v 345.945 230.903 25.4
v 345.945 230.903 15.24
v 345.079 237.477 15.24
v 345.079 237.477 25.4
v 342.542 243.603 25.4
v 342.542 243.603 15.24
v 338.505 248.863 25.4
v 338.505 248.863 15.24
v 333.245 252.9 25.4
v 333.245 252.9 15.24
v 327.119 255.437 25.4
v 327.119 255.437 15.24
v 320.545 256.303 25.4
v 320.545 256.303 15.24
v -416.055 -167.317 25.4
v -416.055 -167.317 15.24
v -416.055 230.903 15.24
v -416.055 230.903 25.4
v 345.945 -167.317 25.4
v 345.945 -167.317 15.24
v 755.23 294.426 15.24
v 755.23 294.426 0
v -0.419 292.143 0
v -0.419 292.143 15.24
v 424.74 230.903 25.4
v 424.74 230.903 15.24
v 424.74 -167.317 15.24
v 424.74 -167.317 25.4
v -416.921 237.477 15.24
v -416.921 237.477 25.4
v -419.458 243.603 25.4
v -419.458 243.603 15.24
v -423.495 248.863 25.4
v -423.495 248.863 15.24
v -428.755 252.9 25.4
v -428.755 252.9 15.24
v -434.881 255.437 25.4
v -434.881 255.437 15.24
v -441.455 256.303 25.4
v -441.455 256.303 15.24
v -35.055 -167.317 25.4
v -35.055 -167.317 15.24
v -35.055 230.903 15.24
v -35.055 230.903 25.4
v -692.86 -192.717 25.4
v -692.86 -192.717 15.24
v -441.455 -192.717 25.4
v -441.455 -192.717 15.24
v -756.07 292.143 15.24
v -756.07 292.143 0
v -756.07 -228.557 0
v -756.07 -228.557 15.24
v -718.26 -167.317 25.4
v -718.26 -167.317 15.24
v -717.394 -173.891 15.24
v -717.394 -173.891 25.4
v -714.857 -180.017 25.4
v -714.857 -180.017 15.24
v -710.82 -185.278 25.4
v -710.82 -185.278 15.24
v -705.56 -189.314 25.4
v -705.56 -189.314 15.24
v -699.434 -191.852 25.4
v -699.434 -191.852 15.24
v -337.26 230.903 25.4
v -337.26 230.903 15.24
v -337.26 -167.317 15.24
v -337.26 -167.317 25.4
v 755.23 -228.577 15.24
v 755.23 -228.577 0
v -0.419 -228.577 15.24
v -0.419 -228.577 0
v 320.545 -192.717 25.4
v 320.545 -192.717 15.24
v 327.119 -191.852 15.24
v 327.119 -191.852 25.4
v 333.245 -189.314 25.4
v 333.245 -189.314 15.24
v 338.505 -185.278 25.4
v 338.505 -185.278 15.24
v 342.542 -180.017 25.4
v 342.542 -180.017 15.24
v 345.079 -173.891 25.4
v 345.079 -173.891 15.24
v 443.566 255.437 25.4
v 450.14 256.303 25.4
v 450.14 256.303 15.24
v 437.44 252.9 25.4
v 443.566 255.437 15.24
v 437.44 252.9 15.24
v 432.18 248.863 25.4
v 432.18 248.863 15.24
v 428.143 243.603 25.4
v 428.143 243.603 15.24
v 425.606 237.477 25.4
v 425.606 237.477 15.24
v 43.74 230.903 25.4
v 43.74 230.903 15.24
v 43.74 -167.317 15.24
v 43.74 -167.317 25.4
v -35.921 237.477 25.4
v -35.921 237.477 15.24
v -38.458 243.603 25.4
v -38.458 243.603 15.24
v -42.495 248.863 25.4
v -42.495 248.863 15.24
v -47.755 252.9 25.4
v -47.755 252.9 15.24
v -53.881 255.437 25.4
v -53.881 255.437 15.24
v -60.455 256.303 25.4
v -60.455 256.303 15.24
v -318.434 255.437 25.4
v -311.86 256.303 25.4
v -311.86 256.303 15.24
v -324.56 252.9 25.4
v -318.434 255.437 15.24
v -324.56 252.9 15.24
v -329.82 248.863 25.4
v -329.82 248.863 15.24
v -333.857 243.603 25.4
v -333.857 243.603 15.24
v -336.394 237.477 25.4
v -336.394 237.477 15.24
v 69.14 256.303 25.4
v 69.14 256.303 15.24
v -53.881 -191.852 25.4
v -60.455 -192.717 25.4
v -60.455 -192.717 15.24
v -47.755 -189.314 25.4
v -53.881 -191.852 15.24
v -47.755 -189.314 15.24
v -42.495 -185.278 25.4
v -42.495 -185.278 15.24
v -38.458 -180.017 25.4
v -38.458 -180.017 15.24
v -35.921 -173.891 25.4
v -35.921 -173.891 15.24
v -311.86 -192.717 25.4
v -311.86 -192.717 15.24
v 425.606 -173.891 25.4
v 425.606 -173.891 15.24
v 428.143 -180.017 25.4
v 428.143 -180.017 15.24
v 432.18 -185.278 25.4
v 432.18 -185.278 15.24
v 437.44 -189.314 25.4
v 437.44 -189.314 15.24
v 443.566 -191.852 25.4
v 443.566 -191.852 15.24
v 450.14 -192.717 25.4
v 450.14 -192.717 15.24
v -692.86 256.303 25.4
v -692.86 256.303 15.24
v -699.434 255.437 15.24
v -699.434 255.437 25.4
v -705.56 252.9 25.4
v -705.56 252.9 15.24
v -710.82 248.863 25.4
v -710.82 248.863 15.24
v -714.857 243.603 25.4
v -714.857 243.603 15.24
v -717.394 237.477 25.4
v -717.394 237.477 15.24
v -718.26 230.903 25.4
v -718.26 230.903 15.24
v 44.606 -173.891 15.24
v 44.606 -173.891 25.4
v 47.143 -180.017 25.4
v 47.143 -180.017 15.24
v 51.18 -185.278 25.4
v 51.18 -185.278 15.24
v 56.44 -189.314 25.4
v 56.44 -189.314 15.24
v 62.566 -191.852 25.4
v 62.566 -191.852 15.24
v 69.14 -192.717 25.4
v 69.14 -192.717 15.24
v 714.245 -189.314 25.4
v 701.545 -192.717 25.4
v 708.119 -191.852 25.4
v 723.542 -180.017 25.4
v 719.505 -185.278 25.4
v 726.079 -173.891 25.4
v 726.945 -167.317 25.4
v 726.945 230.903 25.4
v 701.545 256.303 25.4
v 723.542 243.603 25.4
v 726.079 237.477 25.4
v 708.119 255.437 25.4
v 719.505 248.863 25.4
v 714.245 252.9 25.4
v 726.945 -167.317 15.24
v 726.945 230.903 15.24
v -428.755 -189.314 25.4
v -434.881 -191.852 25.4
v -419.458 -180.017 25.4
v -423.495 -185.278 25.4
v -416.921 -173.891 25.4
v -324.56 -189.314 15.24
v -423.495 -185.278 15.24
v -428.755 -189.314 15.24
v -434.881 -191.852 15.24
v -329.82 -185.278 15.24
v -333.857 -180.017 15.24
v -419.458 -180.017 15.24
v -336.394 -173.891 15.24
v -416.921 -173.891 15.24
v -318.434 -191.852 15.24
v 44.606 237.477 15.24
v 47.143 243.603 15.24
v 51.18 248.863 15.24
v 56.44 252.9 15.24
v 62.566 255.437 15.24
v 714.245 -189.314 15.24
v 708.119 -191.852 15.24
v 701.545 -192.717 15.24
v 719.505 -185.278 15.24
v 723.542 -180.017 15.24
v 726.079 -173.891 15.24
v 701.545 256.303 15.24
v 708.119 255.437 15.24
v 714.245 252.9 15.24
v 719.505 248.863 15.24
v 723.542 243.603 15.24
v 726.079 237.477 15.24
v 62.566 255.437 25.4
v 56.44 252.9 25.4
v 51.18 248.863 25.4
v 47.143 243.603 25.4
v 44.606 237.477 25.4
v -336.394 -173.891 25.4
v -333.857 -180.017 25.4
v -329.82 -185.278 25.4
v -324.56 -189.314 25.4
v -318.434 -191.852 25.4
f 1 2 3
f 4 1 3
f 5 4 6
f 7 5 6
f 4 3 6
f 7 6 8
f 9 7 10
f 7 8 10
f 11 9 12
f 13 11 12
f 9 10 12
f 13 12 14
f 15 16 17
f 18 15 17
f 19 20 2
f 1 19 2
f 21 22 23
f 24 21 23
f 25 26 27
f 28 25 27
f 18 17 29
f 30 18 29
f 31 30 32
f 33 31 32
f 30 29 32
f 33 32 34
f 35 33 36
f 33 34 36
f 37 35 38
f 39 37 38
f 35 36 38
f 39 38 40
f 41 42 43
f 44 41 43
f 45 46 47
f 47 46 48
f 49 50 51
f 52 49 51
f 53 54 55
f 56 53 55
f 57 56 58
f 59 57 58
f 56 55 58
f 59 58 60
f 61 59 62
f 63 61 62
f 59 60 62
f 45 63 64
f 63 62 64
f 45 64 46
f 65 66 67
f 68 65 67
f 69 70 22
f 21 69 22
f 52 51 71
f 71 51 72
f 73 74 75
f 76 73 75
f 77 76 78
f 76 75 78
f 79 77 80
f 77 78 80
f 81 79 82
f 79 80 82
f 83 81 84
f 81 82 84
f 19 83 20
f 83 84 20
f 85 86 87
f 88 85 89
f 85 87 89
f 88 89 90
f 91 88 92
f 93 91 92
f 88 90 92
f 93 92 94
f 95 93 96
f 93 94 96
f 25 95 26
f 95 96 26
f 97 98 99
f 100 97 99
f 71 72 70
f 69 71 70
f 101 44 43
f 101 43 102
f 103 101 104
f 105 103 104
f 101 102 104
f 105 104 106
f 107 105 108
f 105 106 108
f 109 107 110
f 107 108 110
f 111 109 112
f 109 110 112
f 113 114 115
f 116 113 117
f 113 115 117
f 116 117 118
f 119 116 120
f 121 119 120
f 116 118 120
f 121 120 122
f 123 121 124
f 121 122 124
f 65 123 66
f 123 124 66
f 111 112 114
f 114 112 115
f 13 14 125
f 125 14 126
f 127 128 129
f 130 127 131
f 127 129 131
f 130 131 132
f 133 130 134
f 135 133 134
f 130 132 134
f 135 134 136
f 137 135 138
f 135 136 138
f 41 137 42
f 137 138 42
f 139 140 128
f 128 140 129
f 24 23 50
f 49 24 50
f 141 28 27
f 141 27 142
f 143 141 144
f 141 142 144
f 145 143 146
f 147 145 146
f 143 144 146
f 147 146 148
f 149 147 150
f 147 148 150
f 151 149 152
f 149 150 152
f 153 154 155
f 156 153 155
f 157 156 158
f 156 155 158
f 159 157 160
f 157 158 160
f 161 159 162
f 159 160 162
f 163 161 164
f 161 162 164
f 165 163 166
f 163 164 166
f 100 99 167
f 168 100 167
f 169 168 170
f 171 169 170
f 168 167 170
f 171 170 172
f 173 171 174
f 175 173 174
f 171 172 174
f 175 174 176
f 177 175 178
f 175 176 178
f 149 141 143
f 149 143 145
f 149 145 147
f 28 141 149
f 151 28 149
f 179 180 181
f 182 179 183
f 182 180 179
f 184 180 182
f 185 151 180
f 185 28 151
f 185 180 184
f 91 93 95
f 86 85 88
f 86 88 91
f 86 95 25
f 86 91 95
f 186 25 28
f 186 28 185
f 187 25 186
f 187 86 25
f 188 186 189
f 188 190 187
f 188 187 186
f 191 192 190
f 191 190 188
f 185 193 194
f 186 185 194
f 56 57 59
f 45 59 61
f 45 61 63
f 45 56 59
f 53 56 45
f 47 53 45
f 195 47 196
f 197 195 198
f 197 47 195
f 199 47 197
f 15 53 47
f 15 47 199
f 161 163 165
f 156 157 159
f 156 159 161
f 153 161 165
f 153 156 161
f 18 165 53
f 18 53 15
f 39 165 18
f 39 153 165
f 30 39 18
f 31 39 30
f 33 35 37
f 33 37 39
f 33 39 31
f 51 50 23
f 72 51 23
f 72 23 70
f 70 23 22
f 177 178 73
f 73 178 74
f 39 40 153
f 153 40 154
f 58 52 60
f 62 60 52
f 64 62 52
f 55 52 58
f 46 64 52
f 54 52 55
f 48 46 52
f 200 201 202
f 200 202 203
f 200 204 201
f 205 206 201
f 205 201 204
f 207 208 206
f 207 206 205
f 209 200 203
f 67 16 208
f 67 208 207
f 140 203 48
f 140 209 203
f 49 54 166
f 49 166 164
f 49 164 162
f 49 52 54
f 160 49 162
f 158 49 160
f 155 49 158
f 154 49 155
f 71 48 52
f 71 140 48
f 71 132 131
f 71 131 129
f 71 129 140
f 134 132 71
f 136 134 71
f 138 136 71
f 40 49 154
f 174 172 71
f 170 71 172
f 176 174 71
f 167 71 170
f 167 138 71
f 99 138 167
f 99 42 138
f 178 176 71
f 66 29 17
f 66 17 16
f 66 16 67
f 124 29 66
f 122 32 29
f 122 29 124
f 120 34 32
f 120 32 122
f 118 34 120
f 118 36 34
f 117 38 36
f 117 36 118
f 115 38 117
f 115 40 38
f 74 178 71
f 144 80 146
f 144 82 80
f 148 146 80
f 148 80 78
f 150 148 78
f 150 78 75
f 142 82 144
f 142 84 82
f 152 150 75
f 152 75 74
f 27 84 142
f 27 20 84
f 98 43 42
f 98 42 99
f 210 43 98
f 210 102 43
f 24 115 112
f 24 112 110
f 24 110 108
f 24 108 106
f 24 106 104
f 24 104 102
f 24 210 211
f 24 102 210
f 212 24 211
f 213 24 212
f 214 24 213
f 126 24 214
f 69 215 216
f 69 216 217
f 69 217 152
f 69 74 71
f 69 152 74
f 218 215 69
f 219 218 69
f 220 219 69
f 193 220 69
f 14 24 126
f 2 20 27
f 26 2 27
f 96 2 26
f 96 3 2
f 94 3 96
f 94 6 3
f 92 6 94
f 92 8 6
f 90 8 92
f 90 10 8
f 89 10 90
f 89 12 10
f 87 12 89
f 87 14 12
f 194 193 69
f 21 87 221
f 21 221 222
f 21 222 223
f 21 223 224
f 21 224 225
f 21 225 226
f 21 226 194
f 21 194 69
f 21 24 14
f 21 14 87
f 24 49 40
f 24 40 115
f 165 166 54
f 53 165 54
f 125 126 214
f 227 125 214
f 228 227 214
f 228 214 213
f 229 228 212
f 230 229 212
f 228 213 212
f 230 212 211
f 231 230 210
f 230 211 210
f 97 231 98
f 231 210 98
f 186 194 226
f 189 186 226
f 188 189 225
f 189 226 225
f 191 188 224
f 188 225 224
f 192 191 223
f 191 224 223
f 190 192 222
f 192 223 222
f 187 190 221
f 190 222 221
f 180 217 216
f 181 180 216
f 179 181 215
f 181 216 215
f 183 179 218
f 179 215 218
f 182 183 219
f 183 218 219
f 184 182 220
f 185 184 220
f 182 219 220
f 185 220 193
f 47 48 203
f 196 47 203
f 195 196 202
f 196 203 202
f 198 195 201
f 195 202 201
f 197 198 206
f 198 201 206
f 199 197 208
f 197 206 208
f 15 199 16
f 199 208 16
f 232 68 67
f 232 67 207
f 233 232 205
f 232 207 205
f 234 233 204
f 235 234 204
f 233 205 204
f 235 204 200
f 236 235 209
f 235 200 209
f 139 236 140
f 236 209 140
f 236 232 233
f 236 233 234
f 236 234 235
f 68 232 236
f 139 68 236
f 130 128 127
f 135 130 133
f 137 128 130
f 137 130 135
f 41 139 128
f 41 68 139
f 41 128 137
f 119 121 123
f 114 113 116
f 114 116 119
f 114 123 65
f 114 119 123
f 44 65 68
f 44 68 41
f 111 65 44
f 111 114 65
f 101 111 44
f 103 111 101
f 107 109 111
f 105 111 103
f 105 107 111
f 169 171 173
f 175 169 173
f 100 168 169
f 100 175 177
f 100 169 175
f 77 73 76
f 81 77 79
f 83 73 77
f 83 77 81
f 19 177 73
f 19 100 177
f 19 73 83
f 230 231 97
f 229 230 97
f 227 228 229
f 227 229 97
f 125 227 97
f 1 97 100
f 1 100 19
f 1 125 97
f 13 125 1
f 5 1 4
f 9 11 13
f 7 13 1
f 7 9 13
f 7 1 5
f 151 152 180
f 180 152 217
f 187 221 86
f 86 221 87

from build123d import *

# Parameters (mm, degrees)
F1_DEPTH = 15.24
F2_DEPTH = 25.4


with BuildPart() as f1:
    # F0 (on Top) → F1 (new body)
    with BuildSketch(Plane.XY):
        Polygon((-378.244507, 292.142749), (-756.070369, 292.142749), (-756.070369, -228.557251), (-0.418645, -228.577329), (-0.418645, 292.142749), align=None)
        with BuildLine():
            ThreePointArc((-718.259513, 230.902804), (-710.820026, 248.863316), (-692.859513, 256.302804))
            Line((-692.859513, 256.302804), (-441.455363, 256.302804))
            ThreePointArc((-441.455363, 256.302804), (-423.49485, 248.863316), (-416.055363, 230.902804))
            Line((-416.055363, 230.902804), (-416.055363, -167.317306))
            ThreePointArc((-416.055363, -167.317306), (-423.49485, -185.277818), (-441.455363, -192.717306))
            Line((-441.455363, -192.717306), (-692.859513, -192.717306))
            ThreePointArc((-692.859513, -192.717306), (-710.820026, -185.277818), (-718.259513, -167.317306))
            Line((-718.259513, -167.317306), (-718.259513, 230.902804))
        make_face(mode=Mode.SUBTRACT)
        with BuildLine():
            Line((-337.259513, -167.317306), (-337.259513, 230.902804))
            ThreePointArc((-337.259513, 230.902804), (-329.820026, 248.863316), (-311.859513, 256.302804))
            Line((-311.859513, 256.302804), (-60.455363, 256.302804))
            ThreePointArc((-60.455363, 256.302804), (-42.49485, 248.863316), (-35.055363, 230.902804))
            Line((-35.055363, 230.902804), (-35.055363, -167.317306))
            ThreePointArc((-35.055363, -167.317306), (-42.49485, -185.277818), (-60.455363, -192.717306))
            Line((-60.455363, -192.717306), (-311.859513, -192.717306))
            ThreePointArc((-311.859513, -192.717306), (-329.820026, -185.277818), (-337.259513, -167.317306))
        make_face(mode=Mode.SUBTRACT)
        Polygon((-0.418645, 292.142749), (-0.418645, -228.577329), (377.405493, -228.577329), (377.405493, 293.284322), align=None)
        with BuildLine():
            Line((43.740487, -167.317306), (43.740487, 230.902804))
            ThreePointArc((43.740487, 230.902804), (51.179974, 248.863316), (69.140487, 256.302804))
            Line((69.140487, 256.302804), (320.544637, 256.302804))
            ThreePointArc((320.544637, 256.302804), (338.50515, 248.863316), (345.944637, 230.902804))
            Line((345.944637, 230.902804), (345.944637, -167.317306))
            ThreePointArc((345.944637, -167.317306), (338.50515, -185.277818), (320.544637, -192.717306))
            Line((320.544637, -192.717306), (69.140487, -192.717306))
            ThreePointArc((69.140487, -192.717306), (51.179974, -185.277818), (43.740487, -167.317306))
        make_face(mode=Mode.SUBTRACT)
        Polygon((377.405493, 293.284322), (377.405493, -228.577329), (755.229631, -228.577329), (755.229631, 294.425895), align=None)
        with BuildLine():
            Line((424.740487, -167.317306), (424.740487, 230.902804))
            ThreePointArc((424.740487, 230.902804), (432.179974, 248.863316), (450.140487, 256.302804))
            Line((450.140487, 256.302804), (701.544637, 256.302804))
            ThreePointArc((701.544637, 256.302804), (719.50515, 248.863316), (726.944637, 230.902804))
            Line((726.944637, 230.902804), (726.944637, -167.317306))
            ThreePointArc((726.944637, -167.317306), (719.50515, -185.277818), (701.544637, -192.717306))
            Line((701.544637, -192.717306), (450.140487, -192.717306))
            ThreePointArc((450.140487, -192.717306), (432.179974, -185.277818), (424.740487, -167.317306))
        make_face(mode=Mode.SUBTRACT)
    extrude(amount=F1_DEPTH)

    # F0 (on Top) → F2 (join)
    with BuildSketch(Plane.XY):
        with BuildLine():
            Line((-441.455363, 256.302804), (-692.859513, 256.302804))
            ThreePointArc((-692.859513, 256.302804), (-710.820026, 248.863316), (-718.259513, 230.902804))
            Line((-718.259513, 230.902804), (-718.259513, -167.317306))
            ThreePointArc((-718.259513, -167.317306), (-710.820026, -185.277818), (-692.859513, -192.717306))
            Line((-692.859513, -192.717306), (-441.455363, -192.717306))
            ThreePointArc((-441.455363, -192.717306), (-423.49485, -185.277818), (-416.055363, -167.317306))
            Line((-416.055363, -167.317306), (-416.055363, 230.902804))
            ThreePointArc((-416.055363, 230.902804), (-423.49485, 248.863316), (-441.455363, 256.302804))
        make_face()
        with BuildLine():
            ThreePointArc((-311.859513, 256.302804), (-329.820026, 248.863316), (-337.259513, 230.902804))
            Line((-337.259513, 230.902804), (-337.259513, -167.317306))
            ThreePointArc((-337.259513, -167.317306), (-329.820026, -185.277818), (-311.859513, -192.717306))
            Line((-311.859513, -192.717306), (-60.455363, -192.717306))
            ThreePointArc((-60.455363, -192.717306), (-42.49485, -185.277818), (-35.055363, -167.317306))
            Line((-35.055363, -167.317306), (-35.055363, 230.902804))
            ThreePointArc((-35.055363, 230.902804), (-42.49485, 248.863316), (-60.455363, 256.302804))
            Line((-60.455363, 256.302804), (-311.859513, 256.302804))
        make_face()
        with BuildLine():
            ThreePointArc((69.140487, 256.302804), (51.179974, 248.863316), (43.740487, 230.902804))
            Line((43.740487, 230.902804), (43.740487, -167.317306))
            ThreePointArc((43.740487, -167.317306), (51.179974, -185.277818), (69.140487, -192.717306))
            Line((69.140487, -192.717306), (320.544637, -192.717306))
            ThreePointArc((320.544637, -192.717306), (338.50515, -185.277818), (345.944637, -167.317306))
            Line((345.944637, -167.317306), (345.944637, 230.902804))
            ThreePointArc((345.944637, 230.902804), (338.50515, 248.863316), (320.544637, 256.302804))
            Line((320.544637, 256.302804), (69.140487, 256.302804))
        make_face()
        with BuildLine():
            ThreePointArc((450.140487, 256.302804), (432.179974, 248.863316), (424.740487, 230.902804))
            Line((424.740487, 230.902804), (424.740487, -167.317306))
            ThreePointArc((424.740487, -167.317306), (432.179974, -185.277818), (450.140487, -192.717306))
            Line((450.140487, -192.717306), (701.544637, -192.717306))
            ThreePointArc((701.544637, -192.717306), (719.50515, -185.277818), (726.944637, -167.317306))
            Line((726.944637, -167.317306), (726.944637, 230.902804))
            ThreePointArc((726.944637, 230.902804), (719.50515, 248.863316), (701.544637, 256.302804))
            Line((701.544637, 256.302804), (450.140487, 256.302804))
        make_face()
    extrude(amount=F2_DEPTH)


solid = f1.part
